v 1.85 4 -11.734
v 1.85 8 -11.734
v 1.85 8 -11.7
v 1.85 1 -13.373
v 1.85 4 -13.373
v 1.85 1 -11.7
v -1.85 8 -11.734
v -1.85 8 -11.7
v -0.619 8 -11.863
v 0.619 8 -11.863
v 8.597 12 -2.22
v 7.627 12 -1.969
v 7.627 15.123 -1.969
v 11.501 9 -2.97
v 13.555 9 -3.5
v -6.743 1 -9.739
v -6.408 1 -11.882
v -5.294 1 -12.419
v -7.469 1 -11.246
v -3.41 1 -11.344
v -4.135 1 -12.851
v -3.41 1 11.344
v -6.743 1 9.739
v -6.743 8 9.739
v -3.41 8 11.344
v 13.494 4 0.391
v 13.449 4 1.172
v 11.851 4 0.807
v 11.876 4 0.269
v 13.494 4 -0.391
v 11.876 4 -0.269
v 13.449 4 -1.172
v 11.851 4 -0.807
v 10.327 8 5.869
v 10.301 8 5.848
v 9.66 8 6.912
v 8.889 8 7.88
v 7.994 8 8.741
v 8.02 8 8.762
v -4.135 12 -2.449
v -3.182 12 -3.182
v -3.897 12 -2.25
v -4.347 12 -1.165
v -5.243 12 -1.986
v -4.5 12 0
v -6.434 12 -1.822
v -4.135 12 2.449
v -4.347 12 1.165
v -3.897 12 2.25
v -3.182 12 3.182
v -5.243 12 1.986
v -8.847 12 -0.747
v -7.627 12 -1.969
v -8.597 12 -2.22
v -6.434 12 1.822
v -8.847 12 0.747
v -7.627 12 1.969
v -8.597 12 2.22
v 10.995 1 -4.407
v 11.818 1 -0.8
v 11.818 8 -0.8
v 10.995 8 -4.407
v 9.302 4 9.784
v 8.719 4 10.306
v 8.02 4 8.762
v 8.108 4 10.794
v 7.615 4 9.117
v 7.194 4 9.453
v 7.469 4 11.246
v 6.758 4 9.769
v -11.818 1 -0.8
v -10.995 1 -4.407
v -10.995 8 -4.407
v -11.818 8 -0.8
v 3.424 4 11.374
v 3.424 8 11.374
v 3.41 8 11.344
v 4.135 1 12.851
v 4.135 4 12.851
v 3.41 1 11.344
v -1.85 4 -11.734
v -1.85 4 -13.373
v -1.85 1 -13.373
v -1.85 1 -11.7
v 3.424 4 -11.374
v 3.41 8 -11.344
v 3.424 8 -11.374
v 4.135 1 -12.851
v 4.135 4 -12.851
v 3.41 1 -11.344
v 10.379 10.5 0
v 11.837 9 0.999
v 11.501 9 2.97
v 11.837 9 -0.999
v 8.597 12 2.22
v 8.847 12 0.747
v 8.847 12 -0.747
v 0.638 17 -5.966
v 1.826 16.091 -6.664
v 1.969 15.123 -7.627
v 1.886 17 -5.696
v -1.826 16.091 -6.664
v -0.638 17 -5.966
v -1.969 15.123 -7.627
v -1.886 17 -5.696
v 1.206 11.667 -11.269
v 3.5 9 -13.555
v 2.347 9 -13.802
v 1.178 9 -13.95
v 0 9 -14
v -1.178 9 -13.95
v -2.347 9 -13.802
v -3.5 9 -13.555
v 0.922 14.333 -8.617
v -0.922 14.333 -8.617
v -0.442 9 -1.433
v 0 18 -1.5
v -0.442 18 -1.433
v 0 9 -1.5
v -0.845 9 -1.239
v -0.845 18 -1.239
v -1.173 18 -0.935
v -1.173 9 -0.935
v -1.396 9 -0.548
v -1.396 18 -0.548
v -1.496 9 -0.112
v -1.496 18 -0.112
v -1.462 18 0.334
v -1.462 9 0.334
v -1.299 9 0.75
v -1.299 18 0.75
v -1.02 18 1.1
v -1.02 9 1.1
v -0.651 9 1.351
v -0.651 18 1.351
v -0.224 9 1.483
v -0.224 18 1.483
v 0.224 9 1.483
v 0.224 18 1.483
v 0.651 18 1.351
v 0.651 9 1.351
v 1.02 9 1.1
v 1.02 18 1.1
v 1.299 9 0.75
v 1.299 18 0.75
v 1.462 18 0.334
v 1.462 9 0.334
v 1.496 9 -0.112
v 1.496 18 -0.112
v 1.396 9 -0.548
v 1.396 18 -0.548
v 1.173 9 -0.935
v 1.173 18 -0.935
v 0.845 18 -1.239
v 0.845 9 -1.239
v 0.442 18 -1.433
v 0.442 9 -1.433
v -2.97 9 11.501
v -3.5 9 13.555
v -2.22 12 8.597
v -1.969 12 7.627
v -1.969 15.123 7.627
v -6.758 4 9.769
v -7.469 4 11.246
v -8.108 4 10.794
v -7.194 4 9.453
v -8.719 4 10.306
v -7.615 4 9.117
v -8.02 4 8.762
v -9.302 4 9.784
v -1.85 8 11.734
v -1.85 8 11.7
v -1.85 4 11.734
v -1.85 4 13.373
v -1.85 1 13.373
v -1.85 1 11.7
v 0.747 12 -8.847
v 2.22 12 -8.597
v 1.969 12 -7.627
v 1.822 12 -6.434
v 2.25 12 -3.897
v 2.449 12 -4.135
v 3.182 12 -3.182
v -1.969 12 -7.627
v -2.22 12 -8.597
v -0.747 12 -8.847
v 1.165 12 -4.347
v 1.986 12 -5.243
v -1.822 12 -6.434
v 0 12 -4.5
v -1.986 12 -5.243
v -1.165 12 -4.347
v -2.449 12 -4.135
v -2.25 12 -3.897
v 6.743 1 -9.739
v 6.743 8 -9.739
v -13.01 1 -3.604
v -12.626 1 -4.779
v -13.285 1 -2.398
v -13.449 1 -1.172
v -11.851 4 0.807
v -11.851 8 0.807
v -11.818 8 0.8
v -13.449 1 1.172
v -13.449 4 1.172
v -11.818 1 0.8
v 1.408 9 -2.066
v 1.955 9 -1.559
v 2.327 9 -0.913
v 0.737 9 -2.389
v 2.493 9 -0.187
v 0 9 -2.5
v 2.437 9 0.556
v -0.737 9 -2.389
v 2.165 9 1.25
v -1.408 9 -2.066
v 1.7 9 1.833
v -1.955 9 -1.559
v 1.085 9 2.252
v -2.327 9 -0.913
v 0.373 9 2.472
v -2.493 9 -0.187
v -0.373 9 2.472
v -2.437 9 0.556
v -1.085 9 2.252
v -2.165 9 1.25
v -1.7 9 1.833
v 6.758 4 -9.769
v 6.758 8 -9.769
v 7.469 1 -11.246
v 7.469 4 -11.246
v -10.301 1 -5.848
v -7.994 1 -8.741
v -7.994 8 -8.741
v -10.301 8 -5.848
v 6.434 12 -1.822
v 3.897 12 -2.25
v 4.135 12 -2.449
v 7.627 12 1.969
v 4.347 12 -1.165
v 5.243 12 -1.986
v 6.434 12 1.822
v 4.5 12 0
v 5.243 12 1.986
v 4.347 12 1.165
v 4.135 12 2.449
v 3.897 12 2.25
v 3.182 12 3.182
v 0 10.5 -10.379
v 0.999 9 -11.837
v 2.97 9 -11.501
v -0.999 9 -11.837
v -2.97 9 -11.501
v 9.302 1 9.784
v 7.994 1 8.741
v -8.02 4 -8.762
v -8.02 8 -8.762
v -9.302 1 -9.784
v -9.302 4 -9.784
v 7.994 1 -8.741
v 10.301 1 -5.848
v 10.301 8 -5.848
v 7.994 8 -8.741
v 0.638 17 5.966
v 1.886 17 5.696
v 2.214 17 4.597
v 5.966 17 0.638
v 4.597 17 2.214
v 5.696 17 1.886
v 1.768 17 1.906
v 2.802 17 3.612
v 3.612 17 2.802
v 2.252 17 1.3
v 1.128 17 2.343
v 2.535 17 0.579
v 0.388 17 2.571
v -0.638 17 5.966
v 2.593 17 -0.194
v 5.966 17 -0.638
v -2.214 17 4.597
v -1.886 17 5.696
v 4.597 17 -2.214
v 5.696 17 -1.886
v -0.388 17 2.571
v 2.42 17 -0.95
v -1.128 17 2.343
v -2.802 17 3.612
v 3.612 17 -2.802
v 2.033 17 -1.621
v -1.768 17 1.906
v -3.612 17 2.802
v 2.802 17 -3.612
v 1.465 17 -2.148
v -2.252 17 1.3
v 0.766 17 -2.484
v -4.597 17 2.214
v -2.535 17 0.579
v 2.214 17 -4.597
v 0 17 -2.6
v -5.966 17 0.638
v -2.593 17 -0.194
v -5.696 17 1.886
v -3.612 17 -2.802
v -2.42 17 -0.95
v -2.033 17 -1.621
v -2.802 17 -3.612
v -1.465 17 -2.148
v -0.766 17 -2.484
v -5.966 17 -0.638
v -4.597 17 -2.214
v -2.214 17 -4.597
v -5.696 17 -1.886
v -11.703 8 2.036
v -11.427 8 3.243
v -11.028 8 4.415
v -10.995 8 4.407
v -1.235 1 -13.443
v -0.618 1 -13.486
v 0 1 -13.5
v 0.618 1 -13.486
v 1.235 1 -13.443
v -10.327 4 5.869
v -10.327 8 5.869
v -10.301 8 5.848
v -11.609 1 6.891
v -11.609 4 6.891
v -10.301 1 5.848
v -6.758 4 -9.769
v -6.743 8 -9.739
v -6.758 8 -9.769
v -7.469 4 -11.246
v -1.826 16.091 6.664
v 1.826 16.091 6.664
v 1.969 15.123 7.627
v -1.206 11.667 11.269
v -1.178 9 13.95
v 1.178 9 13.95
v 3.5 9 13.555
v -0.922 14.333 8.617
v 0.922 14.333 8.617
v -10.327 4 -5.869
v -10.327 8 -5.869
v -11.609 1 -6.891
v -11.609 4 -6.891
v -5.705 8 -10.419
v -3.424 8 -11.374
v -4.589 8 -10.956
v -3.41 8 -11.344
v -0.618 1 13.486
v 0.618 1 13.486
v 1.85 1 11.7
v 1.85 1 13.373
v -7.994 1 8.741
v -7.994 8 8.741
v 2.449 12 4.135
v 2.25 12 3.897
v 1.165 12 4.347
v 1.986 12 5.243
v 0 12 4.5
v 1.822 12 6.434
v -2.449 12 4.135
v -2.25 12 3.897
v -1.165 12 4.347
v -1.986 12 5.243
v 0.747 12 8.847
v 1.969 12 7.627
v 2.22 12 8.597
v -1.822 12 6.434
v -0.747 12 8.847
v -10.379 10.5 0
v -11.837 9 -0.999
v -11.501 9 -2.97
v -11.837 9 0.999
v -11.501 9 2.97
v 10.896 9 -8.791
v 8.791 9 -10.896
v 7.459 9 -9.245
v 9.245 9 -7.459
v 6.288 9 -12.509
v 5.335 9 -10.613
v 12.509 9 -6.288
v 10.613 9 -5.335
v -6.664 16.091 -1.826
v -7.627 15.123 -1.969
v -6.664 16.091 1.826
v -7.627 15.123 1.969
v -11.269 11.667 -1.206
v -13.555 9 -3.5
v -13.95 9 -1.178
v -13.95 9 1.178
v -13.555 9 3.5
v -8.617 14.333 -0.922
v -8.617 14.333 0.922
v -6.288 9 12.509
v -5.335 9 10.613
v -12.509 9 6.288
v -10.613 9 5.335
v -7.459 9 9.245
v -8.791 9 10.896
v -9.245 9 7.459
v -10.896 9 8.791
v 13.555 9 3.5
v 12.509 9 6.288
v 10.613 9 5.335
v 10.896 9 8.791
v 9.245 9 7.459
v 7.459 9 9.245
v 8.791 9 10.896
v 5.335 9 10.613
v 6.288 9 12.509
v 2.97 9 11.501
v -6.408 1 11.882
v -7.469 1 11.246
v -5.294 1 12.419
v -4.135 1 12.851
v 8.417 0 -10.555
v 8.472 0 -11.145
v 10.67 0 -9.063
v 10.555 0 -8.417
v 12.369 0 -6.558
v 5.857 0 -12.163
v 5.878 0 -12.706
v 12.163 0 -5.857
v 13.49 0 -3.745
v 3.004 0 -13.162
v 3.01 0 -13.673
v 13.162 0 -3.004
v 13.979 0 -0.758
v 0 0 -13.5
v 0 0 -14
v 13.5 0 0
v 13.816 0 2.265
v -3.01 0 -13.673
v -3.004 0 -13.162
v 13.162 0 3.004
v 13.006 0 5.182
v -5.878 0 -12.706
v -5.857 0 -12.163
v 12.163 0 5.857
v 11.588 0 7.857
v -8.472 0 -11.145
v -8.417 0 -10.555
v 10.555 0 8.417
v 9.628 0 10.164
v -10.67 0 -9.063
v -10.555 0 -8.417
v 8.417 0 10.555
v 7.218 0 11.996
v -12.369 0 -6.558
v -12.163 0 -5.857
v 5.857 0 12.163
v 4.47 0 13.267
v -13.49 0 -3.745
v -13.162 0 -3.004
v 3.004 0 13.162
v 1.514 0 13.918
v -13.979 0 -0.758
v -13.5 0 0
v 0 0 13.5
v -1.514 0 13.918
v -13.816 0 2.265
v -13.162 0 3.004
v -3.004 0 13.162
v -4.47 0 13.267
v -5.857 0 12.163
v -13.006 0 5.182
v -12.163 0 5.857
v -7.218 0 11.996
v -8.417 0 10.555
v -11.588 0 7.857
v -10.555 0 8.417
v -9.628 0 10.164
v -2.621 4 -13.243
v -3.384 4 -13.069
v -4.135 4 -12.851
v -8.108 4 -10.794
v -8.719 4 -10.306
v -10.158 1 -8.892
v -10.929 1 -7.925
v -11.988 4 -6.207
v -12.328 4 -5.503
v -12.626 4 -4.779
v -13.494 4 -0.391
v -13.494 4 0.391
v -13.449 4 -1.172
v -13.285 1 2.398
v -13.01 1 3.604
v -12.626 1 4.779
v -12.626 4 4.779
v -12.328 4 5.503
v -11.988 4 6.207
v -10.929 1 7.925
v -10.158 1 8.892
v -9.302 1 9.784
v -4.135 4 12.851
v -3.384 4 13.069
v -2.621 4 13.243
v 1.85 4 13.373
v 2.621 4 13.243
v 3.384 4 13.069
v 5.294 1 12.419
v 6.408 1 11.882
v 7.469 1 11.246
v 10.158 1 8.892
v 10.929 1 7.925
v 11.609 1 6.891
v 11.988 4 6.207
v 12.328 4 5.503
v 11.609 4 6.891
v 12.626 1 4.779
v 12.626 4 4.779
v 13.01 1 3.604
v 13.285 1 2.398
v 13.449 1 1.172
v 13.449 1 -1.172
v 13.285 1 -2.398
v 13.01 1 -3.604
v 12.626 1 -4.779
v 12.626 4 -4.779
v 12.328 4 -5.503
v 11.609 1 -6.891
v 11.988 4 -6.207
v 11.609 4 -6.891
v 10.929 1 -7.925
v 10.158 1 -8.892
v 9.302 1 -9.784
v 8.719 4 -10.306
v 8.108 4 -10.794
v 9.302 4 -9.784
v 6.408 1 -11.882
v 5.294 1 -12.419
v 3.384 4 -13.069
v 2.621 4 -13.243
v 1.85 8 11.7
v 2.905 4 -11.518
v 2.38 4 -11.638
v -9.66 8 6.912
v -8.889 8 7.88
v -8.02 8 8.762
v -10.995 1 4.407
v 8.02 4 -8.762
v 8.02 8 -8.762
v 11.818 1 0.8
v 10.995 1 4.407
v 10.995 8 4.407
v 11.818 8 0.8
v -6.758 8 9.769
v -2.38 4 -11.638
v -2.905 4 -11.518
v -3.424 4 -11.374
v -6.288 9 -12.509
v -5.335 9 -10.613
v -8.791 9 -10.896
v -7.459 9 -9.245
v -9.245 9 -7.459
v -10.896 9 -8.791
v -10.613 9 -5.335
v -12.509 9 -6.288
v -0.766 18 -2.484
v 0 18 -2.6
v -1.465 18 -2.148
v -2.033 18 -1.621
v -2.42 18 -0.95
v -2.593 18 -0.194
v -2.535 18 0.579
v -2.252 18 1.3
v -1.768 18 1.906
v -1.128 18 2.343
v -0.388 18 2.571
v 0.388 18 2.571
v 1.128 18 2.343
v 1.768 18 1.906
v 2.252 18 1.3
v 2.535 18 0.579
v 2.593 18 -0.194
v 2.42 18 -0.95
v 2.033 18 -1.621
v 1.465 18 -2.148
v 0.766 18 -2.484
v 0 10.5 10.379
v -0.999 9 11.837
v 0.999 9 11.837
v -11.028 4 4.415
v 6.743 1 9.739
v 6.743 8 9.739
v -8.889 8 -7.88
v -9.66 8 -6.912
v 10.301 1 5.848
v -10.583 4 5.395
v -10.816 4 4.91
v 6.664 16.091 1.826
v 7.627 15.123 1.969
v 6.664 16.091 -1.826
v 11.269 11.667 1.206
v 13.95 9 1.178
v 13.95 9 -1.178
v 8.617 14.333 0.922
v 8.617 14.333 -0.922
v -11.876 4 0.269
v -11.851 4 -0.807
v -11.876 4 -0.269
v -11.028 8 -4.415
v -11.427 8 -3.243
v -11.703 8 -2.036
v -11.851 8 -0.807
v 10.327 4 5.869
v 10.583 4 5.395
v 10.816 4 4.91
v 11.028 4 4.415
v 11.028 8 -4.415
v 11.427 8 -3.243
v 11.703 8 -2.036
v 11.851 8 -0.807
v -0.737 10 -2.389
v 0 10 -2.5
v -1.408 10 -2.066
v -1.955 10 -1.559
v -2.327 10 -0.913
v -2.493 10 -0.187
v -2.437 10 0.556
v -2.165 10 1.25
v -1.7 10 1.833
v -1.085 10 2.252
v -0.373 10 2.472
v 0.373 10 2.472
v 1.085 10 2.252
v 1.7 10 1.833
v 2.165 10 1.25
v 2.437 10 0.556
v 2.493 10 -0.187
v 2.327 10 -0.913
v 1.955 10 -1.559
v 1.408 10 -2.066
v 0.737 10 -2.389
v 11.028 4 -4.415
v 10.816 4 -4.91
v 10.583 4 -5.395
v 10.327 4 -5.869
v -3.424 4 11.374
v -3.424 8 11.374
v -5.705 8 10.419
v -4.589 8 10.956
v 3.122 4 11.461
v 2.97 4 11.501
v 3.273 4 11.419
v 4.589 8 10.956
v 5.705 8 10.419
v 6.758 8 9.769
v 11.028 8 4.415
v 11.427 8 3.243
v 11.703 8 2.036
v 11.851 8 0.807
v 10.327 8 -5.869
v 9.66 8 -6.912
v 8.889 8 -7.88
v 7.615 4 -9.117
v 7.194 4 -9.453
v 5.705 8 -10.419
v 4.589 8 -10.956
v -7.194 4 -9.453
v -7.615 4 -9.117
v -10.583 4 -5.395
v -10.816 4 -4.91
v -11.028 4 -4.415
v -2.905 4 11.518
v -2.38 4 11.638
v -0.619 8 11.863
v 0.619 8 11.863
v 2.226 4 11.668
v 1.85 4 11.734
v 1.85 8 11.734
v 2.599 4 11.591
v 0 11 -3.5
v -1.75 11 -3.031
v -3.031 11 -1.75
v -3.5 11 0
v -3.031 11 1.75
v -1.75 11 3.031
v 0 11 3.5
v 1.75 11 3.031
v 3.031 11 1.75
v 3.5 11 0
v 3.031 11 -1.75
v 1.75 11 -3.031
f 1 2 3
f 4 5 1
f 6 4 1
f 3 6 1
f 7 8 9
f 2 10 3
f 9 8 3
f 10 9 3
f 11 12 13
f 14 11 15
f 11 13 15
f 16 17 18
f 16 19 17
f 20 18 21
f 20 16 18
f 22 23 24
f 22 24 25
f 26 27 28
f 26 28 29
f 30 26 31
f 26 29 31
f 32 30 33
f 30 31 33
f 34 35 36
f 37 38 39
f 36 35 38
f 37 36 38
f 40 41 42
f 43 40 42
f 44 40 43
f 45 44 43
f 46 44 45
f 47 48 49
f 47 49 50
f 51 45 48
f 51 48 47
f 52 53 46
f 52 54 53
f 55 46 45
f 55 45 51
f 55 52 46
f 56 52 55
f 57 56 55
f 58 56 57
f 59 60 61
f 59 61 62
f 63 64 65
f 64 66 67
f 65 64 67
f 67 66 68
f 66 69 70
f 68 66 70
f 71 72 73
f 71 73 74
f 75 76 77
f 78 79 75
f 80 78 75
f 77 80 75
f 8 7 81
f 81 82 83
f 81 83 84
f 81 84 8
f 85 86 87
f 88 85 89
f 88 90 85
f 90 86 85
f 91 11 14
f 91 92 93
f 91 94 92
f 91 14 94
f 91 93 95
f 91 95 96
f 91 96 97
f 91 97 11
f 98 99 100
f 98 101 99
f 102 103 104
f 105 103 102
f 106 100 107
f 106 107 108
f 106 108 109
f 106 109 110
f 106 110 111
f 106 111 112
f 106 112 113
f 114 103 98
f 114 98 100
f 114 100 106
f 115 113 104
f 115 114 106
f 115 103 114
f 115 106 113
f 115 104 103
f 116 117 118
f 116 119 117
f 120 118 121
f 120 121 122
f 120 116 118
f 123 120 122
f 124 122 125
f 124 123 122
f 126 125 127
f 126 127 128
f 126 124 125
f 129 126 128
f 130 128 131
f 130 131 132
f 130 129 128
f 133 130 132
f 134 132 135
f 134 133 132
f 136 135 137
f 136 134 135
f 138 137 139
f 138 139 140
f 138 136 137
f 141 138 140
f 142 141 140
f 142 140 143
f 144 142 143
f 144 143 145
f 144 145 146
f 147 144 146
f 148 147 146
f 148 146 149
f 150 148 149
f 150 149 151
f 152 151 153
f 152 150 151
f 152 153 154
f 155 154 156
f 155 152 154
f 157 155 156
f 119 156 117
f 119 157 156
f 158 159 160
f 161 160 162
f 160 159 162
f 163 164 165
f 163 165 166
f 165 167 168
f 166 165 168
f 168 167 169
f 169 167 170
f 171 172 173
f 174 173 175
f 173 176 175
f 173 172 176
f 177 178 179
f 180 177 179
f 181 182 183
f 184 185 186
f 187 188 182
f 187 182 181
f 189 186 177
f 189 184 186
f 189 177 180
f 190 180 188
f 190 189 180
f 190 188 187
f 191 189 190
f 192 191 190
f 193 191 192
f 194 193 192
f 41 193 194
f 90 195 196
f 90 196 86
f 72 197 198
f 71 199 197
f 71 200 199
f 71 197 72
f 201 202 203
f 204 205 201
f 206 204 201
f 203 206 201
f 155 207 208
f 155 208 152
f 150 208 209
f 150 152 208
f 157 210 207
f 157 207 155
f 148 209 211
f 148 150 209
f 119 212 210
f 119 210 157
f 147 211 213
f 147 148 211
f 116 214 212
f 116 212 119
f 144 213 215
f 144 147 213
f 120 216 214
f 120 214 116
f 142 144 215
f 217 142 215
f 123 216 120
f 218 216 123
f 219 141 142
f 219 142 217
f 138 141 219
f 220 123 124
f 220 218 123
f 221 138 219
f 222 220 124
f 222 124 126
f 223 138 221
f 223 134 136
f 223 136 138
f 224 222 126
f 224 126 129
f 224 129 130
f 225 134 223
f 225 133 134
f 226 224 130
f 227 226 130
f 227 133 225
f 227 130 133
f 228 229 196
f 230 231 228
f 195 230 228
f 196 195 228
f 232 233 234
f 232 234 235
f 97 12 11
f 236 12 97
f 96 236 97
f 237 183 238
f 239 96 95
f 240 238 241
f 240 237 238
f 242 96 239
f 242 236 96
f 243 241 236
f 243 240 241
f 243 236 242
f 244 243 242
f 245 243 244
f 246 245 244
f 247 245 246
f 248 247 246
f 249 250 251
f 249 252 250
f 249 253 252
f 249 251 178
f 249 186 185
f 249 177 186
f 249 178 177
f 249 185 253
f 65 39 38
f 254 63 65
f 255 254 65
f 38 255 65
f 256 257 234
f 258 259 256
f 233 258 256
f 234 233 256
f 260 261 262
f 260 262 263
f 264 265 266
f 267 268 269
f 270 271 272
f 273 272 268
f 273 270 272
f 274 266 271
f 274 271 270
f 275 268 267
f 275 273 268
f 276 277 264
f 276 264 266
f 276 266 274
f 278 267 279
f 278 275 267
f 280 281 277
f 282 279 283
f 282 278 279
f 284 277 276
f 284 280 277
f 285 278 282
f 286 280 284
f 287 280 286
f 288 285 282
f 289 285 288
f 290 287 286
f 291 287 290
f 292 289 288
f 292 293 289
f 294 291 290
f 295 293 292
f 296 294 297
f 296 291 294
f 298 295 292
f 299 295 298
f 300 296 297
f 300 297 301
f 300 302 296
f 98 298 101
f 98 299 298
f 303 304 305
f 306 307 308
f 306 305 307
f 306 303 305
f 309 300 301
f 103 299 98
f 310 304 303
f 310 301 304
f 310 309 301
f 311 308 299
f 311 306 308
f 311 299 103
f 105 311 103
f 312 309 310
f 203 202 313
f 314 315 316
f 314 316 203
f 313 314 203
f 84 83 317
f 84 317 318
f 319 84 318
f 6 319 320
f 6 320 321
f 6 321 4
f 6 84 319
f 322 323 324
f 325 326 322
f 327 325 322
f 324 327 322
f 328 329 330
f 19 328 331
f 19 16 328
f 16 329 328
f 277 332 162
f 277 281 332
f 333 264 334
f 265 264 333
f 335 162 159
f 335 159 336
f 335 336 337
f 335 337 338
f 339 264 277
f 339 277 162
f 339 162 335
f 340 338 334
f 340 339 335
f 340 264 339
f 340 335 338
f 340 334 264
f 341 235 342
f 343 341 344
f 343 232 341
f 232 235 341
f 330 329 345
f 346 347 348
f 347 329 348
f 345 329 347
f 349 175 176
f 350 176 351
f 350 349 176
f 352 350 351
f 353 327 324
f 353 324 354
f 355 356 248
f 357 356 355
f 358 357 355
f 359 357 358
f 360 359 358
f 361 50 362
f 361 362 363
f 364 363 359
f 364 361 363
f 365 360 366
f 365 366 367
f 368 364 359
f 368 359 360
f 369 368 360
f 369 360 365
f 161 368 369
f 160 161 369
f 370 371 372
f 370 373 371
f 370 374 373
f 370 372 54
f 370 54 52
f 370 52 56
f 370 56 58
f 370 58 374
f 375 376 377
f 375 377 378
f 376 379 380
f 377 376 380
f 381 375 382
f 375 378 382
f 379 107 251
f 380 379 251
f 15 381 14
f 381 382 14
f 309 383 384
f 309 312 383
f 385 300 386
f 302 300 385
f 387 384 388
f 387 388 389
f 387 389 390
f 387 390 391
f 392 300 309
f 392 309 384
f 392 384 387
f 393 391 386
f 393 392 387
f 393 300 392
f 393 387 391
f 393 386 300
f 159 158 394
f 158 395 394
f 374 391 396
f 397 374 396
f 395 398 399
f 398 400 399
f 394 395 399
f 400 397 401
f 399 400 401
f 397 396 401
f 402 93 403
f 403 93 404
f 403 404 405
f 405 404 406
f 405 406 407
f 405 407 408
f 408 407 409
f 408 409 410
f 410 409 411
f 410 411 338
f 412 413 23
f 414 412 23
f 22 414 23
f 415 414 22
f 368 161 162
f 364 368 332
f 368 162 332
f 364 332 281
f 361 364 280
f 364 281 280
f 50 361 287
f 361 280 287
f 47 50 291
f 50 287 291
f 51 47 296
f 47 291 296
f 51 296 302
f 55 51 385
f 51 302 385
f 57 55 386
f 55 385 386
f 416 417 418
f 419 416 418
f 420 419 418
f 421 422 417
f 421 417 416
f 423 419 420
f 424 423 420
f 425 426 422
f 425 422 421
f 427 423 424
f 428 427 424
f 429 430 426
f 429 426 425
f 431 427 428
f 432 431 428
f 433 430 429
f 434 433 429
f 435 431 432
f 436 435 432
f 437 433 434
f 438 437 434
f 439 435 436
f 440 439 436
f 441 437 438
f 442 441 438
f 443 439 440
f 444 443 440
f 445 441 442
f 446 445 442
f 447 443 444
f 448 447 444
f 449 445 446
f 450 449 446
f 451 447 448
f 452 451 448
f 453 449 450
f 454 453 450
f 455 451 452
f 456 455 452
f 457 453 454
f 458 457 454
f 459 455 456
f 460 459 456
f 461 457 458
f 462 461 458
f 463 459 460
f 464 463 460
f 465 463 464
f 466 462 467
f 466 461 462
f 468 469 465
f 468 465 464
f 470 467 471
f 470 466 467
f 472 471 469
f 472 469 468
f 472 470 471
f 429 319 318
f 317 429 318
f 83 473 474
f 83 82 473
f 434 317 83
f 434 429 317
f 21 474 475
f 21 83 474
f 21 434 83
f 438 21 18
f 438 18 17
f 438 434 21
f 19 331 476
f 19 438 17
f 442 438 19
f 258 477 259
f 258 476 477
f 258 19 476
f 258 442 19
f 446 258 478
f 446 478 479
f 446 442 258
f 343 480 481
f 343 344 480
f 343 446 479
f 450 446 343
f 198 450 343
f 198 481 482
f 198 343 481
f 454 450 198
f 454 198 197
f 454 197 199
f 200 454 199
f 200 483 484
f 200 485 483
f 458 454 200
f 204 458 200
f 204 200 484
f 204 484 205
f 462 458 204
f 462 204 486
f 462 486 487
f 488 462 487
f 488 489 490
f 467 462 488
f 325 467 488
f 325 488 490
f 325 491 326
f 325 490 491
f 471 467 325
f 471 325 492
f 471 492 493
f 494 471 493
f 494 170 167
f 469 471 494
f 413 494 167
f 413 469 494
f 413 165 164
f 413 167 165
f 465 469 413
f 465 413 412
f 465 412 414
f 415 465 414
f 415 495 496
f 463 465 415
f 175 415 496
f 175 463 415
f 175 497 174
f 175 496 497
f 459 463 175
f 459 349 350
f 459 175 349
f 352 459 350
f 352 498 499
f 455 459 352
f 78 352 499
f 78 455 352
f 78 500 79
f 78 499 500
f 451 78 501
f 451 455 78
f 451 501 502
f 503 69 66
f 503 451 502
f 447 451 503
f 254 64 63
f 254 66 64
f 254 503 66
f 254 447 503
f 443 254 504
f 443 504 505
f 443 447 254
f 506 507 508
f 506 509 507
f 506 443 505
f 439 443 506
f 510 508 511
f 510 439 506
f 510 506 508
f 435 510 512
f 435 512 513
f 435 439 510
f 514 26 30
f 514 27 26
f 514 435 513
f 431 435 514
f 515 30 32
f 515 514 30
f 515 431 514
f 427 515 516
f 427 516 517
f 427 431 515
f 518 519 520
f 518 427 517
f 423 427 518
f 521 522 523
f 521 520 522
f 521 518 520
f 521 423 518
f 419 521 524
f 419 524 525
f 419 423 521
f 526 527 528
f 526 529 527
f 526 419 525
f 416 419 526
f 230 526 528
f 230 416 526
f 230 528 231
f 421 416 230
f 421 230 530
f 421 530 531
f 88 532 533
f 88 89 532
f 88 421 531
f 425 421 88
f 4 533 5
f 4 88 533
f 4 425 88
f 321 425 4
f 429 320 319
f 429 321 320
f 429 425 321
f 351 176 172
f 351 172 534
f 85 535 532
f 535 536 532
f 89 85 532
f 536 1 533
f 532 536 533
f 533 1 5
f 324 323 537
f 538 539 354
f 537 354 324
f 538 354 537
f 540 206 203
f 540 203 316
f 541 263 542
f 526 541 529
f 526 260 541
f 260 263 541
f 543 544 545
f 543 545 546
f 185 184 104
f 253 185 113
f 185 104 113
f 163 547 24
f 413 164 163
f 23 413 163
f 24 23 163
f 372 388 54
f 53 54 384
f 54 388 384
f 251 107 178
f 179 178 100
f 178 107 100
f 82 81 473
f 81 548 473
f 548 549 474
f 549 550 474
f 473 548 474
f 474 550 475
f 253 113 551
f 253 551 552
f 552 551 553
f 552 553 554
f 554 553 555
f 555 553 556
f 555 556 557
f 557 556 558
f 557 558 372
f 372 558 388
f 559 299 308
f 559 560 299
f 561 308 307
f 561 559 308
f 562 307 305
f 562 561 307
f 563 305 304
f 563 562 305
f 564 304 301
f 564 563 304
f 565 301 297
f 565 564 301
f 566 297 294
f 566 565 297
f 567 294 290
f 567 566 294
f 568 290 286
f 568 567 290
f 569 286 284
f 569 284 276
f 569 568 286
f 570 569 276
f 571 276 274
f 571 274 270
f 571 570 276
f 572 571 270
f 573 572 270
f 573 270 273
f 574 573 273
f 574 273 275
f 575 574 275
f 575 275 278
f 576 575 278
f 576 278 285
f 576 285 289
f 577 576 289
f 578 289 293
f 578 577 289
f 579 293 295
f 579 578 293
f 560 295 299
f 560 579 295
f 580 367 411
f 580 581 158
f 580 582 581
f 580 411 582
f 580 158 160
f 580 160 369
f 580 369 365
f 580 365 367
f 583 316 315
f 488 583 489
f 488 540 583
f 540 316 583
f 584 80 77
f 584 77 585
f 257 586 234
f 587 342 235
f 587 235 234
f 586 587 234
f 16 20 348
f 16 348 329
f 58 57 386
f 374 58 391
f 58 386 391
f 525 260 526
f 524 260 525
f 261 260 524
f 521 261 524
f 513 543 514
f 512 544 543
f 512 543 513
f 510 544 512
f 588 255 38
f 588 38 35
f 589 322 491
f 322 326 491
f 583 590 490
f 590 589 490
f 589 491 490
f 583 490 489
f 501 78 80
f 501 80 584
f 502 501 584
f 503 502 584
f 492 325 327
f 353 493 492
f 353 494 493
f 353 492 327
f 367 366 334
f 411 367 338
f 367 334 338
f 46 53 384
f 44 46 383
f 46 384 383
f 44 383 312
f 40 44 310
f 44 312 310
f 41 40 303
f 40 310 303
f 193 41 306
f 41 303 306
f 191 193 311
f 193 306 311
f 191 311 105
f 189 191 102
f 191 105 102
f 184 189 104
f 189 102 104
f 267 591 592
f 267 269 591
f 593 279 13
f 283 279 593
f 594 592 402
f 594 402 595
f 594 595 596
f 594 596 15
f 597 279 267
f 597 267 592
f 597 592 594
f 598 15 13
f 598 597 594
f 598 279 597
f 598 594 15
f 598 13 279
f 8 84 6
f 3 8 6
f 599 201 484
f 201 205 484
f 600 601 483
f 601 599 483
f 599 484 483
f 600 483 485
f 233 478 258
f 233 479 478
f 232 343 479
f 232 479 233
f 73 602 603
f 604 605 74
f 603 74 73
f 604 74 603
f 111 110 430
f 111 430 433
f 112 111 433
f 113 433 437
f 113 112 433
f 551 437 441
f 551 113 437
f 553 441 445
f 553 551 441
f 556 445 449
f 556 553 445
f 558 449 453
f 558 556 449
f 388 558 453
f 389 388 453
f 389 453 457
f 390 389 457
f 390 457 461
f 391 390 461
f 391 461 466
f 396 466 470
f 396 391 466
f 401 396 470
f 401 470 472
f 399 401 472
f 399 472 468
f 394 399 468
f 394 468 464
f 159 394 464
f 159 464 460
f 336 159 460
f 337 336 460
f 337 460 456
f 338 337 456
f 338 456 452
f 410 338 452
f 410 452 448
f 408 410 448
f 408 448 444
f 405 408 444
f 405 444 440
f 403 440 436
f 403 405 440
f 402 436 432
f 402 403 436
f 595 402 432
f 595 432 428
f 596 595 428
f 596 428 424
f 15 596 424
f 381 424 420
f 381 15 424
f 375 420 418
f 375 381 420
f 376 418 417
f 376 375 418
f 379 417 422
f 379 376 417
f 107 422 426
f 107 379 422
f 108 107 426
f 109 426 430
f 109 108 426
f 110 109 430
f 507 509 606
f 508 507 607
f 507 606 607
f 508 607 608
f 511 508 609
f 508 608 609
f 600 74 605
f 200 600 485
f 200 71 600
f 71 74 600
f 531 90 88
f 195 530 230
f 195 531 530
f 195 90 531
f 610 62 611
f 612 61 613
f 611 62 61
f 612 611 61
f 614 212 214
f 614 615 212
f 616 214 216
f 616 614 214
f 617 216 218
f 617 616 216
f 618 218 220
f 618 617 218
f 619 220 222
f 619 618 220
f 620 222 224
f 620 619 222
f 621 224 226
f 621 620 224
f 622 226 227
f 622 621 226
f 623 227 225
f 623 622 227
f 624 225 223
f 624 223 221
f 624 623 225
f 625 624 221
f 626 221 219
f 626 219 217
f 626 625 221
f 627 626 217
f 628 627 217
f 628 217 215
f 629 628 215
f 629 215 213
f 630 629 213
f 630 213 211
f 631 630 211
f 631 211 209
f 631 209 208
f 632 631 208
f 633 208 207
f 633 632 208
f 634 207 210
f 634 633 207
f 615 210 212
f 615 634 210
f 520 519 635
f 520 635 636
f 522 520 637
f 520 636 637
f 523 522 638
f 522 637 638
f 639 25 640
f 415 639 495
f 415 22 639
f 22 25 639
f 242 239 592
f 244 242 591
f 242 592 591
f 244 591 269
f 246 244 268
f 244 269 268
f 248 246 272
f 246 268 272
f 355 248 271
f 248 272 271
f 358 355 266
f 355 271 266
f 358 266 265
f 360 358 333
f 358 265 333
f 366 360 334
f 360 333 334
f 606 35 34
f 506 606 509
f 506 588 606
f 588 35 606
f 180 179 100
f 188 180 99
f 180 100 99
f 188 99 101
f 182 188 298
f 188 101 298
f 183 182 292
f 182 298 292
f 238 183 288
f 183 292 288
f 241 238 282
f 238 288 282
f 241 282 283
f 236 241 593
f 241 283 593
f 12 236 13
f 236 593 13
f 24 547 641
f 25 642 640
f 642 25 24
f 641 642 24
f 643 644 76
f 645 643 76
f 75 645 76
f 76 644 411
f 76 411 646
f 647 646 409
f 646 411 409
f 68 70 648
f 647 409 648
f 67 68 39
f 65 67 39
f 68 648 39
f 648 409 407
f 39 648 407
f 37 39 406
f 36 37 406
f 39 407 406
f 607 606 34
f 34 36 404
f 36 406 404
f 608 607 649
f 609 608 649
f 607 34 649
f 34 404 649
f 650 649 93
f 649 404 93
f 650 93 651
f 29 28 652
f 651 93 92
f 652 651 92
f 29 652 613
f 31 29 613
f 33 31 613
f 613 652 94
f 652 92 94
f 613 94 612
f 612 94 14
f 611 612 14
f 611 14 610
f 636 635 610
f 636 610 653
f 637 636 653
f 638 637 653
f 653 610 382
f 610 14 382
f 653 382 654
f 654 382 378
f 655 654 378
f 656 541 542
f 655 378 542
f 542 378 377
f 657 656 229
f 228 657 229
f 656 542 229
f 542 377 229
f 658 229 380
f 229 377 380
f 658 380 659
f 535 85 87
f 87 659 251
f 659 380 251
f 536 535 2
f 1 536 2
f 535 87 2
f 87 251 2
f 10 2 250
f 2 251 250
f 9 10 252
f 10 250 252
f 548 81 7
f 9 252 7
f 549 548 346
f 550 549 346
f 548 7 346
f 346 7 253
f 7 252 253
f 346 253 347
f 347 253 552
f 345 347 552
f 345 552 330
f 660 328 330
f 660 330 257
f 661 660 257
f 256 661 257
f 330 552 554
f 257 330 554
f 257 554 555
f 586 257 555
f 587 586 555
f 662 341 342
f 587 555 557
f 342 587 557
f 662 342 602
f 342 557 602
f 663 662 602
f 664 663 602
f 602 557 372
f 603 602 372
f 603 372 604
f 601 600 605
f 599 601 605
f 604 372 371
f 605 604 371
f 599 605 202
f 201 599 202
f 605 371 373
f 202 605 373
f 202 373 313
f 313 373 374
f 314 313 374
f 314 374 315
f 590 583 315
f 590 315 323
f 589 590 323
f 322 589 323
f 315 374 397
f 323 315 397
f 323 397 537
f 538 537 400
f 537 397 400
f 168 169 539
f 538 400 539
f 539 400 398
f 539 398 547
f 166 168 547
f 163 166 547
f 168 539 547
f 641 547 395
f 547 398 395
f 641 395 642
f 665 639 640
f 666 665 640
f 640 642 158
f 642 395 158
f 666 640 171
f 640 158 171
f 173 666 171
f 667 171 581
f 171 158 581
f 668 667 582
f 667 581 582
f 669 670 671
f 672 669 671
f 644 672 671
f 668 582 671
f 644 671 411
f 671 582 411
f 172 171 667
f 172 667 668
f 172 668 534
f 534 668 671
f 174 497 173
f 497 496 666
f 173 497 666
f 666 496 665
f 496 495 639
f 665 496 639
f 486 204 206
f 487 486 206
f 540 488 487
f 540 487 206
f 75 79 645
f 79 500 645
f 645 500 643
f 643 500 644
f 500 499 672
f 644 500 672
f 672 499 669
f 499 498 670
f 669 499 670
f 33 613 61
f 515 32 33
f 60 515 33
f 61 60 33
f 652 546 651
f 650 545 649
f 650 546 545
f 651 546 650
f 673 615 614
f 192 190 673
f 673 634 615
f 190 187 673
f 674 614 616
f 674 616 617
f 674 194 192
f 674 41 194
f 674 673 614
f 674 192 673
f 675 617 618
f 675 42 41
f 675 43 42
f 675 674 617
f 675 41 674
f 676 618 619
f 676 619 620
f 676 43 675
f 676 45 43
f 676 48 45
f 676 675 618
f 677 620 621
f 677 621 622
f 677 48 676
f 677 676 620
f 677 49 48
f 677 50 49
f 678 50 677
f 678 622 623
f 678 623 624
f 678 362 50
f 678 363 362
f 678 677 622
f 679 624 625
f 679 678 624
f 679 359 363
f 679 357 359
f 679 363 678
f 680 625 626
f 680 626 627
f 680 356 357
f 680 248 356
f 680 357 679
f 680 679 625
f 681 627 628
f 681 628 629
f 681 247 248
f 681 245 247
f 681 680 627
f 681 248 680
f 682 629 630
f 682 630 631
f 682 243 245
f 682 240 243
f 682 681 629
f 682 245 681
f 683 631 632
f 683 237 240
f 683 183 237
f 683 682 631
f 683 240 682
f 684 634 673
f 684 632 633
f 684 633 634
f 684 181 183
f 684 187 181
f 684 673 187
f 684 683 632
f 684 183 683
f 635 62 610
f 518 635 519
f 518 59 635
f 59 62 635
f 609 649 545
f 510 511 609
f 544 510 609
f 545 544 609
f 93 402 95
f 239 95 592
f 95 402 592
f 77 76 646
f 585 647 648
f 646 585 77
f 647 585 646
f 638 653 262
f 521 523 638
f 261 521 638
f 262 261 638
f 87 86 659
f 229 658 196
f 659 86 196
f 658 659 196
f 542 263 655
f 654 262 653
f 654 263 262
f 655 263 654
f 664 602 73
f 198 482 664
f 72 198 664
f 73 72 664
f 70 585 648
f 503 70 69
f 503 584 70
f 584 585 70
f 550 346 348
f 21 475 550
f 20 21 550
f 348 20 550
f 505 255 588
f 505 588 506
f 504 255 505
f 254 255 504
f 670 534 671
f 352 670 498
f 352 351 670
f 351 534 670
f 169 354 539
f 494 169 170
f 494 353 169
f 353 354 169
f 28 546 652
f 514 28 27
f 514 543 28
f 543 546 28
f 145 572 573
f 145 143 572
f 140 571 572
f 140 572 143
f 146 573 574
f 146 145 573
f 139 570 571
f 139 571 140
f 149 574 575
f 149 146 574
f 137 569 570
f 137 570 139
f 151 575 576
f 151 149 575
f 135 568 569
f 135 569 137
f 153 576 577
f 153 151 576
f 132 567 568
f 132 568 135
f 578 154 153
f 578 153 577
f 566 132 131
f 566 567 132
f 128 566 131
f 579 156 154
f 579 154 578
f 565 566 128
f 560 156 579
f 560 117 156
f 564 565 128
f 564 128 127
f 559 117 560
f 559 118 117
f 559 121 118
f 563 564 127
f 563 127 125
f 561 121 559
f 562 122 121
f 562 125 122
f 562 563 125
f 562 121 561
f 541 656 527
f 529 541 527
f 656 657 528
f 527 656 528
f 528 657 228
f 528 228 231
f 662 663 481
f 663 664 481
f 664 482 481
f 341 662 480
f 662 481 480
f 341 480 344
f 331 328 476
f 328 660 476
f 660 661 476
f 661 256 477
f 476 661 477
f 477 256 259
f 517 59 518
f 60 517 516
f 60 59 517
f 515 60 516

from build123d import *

# Parameters (mm, degrees)
CUT_EXTRUDE1_REACH  = 28.096
SKETCH5_R           = 14
SKETCH5_R_2         = 11.878679656
BOSS_EXTRUDE2_DEPTH = 5
BOSS_EXTRUDE3_START = -1
SKETCH3_W           = 3.7
SKETCH3_H           = 1.8
BOSS_EXTRUDE3_DEPTH = 7


with BuildPart() as part:
    # Sketch1 → Revolve1 (revolve)
    with BuildSketch(Plane.XY, mode=Mode.PRIVATE) as revolve1_sk:
        Polygon((14, 0), (14, 9), (6, 17), (2.6, 17), (2.6, 18), (1.5, 18), (1.5, 9), (2.5, 9), (2.5, 10), (4.5, 12), (8.878679656, 12), (13.5, 7.378679656), (13.5, 0), align=None)
    revolve(revolve1_sk.sketch.rotate(Axis((0, 0, 0), (0, 1, 0)), 90), axis=Axis((0, 0, 0), (0, 1, 0)))

    # Cut-Extrude1: up to this face of the body (flat: up to its plane)
    cut_extrude1_end = Plane(part.part.faces().sort_by_distance((0, 9, 1.570710678))[0])
    # Sketch2 → Cut-Extrude1 (cut, up to the picked face)
    with BuildSketch(Plane(origin=(0, 17, 0), x_dir=(1, 0, 0), z_dir=(0, 1, 0)), mode=Mode.PRIVATE) as cut_extrude1_sk1:
        with BuildLine():
            Line((3.5, 13.555441712), (1.969238681, 7.626828615))
            ThreePointArc((1.969238681, 7.626828615), (3.181980515, 3.181980515), (7.626828615, 1.969238681))
            Line((7.626828615, 1.969238681), (13.555441712, 3.5))
            ThreePointArc((13.555441712, 3.5), (9.899494937, 9.899494937), (3.5, 13.555441712))
        make_face()
    cut_extrude1_tool1 = split(extrude(cut_extrude1_sk1.sketch, amount=-CUT_EXTRUDE1_REACH, mode=Mode.PRIVATE), bisect_by=cut_extrude1_end, keep=Keep.BOTH, mode=Mode.PRIVATE)
    # Sketch2 → Cut-Extrude1 (cut, up to the picked face)
    with BuildSketch(Plane(origin=(0, 17, 0), x_dir=(1, 0, 0), z_dir=(0, 1, 0)), mode=Mode.PRIVATE) as cut_extrude1_sk2:
        with BuildLine():
            Line((13.555441712, -3.5), (7.626828615, -1.969238681))
            ThreePointArc((7.626828615, -1.969238681), (3.181980515, -3.181980515), (1.969238681, -7.626828615))
            Line((1.969238681, -7.626828615), (3.5, -13.555441712))
            ThreePointArc((3.5, -13.555441712), (9.899494937, -9.899494937), (13.555441712, -3.5))
        make_face()
    cut_extrude1_tool2 = split(extrude(cut_extrude1_sk2.sketch, amount=-CUT_EXTRUDE1_REACH, mode=Mode.PRIVATE), bisect_by=cut_extrude1_end, keep=Keep.BOTH, mode=Mode.PRIVATE)
    # Sketch2 → Cut-Extrude1 (cut, up to the picked face)
    with BuildSketch(Plane(origin=(0, 17, 0), x_dir=(1, 0, 0), z_dir=(0, 1, 0)), mode=Mode.PRIVATE) as cut_extrude1_sk3:
        with BuildLine():
            Line((-3.5, -13.555441712), (-1.969238681, -7.626828615))
            ThreePointArc((-1.969238681, -7.626828615), (-3.181980515, -3.181980515), (-7.626828615, -1.969238681))
            Line((-7.626828615, -1.969238681), (-13.555441712, -3.5))
            ThreePointArc((-13.555441712, -3.5), (-9.899494937, -9.899494937), (-3.5, -13.555441712))
        make_face()
    cut_extrude1_tool3 = split(extrude(cut_extrude1_sk3.sketch, amount=-CUT_EXTRUDE1_REACH, mode=Mode.PRIVATE), bisect_by=cut_extrude1_end, keep=Keep.BOTH, mode=Mode.PRIVATE)
    # Sketch2 → Cut-Extrude1 (cut, up to the picked face)
    with BuildSketch(Plane(origin=(0, 17, 0), x_dir=(1, 0, 0), z_dir=(0, 1, 0)), mode=Mode.PRIVATE) as cut_extrude1_sk4:
        with BuildLine():
            Line((-13.555441712, 3.5), (-7.626828615, 1.969238681))
            ThreePointArc((-7.626828615, 1.969238681), (-3.181980515, 3.181980515), (-1.969238681, 7.626828615))
            Line((-1.969238681, 7.626828615), (-3.5, 13.555441712))
            ThreePointArc((-3.5, 13.555441712), (-9.899494937, 9.899494937), (-13.555441712, 3.5))
        make_face()
    cut_extrude1_tool4 = split(extrude(cut_extrude1_sk4.sketch, amount=-CUT_EXTRUDE1_REACH, mode=Mode.PRIVATE), bisect_by=cut_extrude1_end, keep=Keep.BOTH, mode=Mode.PRIVATE)
    add(cut_extrude1_tool1.solids().sort_by(Axis((6.913029, 17, -6.913029), (0, -1, 0)))[0], mode=Mode.SUBTRACT)
    add(cut_extrude1_tool2.solids().sort_by(Axis((6.913029, 17, 6.913029), (0, -1, 0)))[0], mode=Mode.SUBTRACT)
    add(cut_extrude1_tool3.solids().sort_by(Axis((-6.913029, 17, 6.913029), (0, -1, 0)))[0], mode=Mode.SUBTRACT)
    add(cut_extrude1_tool4.solids().sort_by(Axis((-6.913029, 17, -6.913029), (0, -1, 0)))[0], mode=Mode.SUBTRACT)

    # Sketch5 → Boss-Extrude2 (add)
    with BuildSketch(Plane(origin=(0, 9, 0), x_dir=(1, 0, 0), z_dir=(0, 1, 0))):
        with Locations(Location((0, 0, 0), (0, 0, 90))):
            Circle(SKETCH5_R)
        with Locations(Location((0, 0, 0), (0, 0, 284.477512186))):
            Circle(SKETCH5_R_2, mode=Mode.SUBTRACT)
    extrude(amount=-BOSS_EXTRUDE2_DEPTH)

    # Sketch3 → Boss-Extrude3 (add)
    with BuildSketch(Plane.XZ.offset(BOSS_EXTRUDE3_START)):
        with Locations((0, 12.6)):
            Rectangle(SKETCH3_W, SKETCH3_H)
        Polygon((3.409647342, 11.344020672), (6.743232153, 9.738650837), (7.524222884, 11.360394799), (4.190638072, 12.965764634), align=None)
        Polygon((7.993972211, 8.741218924), (10.300884478, 5.848442439), (11.708181147, 6.970724083), (9.40126888, 9.863500568), align=None)
        Polygon((10.994992845, 4.407111565), (11.8183203, 0.79987829), (13.573190542, 1.200415971), (12.749863087, 4.807649246), align=None)
        Polygon((11.8183203, -0.79987829), (10.994992845, -4.407111565), (12.749863087, -4.807649246), (13.573190542, -1.200415971), align=None)
        Polygon((10.300884478, -5.848442439), (7.993972211, -8.741218924), (9.40126888, -9.863500568), (11.708181147, -6.970724083), align=None)
        Polygon((6.743232153, -9.738650837), (3.409647342, -11.344020672), (4.190638072, -12.965764634), (7.524222884, -11.360394799), align=None)
        with Locations((0, -12.6)):
            Rectangle(SKETCH3_W, SKETCH3_H)
        Polygon((-3.409647342, -11.344020672), (-6.743232153, -9.738650837), (-7.524222884, -11.360394799), (-4.190638072, -12.965764634), align=None)
        Polygon((-7.993972211, -8.741218924), (-10.300884478, -5.848442439), (-11.708181147, -6.970724083), (-9.40126888, -9.863500568), align=None)
        Polygon((-10.994992845, -4.407111565), (-11.8183203, -0.79987829), (-13.573190542, -1.200415971), (-12.749863087, -4.807649246), align=None)
        Polygon((-11.8183203, 0.79987829), (-10.994992845, 4.407111565), (-12.749863087, 4.807649246), (-13.573190542, 1.200415971), align=None)
        Polygon((-10.300884478, 5.848442439), (-7.993972211, 8.741218924), (-9.40126888, 9.863500568), (-11.708181147, 6.970724083), align=None)
        Polygon((-6.743232153, 9.738650837), (-3.409647342, 11.344020672), (-4.190638072, 12.965764634), (-7.524222884, 11.360394799), align=None)
    extrude(amount=-BOSS_EXTRUDE3_DEPTH)


solid = part.part
